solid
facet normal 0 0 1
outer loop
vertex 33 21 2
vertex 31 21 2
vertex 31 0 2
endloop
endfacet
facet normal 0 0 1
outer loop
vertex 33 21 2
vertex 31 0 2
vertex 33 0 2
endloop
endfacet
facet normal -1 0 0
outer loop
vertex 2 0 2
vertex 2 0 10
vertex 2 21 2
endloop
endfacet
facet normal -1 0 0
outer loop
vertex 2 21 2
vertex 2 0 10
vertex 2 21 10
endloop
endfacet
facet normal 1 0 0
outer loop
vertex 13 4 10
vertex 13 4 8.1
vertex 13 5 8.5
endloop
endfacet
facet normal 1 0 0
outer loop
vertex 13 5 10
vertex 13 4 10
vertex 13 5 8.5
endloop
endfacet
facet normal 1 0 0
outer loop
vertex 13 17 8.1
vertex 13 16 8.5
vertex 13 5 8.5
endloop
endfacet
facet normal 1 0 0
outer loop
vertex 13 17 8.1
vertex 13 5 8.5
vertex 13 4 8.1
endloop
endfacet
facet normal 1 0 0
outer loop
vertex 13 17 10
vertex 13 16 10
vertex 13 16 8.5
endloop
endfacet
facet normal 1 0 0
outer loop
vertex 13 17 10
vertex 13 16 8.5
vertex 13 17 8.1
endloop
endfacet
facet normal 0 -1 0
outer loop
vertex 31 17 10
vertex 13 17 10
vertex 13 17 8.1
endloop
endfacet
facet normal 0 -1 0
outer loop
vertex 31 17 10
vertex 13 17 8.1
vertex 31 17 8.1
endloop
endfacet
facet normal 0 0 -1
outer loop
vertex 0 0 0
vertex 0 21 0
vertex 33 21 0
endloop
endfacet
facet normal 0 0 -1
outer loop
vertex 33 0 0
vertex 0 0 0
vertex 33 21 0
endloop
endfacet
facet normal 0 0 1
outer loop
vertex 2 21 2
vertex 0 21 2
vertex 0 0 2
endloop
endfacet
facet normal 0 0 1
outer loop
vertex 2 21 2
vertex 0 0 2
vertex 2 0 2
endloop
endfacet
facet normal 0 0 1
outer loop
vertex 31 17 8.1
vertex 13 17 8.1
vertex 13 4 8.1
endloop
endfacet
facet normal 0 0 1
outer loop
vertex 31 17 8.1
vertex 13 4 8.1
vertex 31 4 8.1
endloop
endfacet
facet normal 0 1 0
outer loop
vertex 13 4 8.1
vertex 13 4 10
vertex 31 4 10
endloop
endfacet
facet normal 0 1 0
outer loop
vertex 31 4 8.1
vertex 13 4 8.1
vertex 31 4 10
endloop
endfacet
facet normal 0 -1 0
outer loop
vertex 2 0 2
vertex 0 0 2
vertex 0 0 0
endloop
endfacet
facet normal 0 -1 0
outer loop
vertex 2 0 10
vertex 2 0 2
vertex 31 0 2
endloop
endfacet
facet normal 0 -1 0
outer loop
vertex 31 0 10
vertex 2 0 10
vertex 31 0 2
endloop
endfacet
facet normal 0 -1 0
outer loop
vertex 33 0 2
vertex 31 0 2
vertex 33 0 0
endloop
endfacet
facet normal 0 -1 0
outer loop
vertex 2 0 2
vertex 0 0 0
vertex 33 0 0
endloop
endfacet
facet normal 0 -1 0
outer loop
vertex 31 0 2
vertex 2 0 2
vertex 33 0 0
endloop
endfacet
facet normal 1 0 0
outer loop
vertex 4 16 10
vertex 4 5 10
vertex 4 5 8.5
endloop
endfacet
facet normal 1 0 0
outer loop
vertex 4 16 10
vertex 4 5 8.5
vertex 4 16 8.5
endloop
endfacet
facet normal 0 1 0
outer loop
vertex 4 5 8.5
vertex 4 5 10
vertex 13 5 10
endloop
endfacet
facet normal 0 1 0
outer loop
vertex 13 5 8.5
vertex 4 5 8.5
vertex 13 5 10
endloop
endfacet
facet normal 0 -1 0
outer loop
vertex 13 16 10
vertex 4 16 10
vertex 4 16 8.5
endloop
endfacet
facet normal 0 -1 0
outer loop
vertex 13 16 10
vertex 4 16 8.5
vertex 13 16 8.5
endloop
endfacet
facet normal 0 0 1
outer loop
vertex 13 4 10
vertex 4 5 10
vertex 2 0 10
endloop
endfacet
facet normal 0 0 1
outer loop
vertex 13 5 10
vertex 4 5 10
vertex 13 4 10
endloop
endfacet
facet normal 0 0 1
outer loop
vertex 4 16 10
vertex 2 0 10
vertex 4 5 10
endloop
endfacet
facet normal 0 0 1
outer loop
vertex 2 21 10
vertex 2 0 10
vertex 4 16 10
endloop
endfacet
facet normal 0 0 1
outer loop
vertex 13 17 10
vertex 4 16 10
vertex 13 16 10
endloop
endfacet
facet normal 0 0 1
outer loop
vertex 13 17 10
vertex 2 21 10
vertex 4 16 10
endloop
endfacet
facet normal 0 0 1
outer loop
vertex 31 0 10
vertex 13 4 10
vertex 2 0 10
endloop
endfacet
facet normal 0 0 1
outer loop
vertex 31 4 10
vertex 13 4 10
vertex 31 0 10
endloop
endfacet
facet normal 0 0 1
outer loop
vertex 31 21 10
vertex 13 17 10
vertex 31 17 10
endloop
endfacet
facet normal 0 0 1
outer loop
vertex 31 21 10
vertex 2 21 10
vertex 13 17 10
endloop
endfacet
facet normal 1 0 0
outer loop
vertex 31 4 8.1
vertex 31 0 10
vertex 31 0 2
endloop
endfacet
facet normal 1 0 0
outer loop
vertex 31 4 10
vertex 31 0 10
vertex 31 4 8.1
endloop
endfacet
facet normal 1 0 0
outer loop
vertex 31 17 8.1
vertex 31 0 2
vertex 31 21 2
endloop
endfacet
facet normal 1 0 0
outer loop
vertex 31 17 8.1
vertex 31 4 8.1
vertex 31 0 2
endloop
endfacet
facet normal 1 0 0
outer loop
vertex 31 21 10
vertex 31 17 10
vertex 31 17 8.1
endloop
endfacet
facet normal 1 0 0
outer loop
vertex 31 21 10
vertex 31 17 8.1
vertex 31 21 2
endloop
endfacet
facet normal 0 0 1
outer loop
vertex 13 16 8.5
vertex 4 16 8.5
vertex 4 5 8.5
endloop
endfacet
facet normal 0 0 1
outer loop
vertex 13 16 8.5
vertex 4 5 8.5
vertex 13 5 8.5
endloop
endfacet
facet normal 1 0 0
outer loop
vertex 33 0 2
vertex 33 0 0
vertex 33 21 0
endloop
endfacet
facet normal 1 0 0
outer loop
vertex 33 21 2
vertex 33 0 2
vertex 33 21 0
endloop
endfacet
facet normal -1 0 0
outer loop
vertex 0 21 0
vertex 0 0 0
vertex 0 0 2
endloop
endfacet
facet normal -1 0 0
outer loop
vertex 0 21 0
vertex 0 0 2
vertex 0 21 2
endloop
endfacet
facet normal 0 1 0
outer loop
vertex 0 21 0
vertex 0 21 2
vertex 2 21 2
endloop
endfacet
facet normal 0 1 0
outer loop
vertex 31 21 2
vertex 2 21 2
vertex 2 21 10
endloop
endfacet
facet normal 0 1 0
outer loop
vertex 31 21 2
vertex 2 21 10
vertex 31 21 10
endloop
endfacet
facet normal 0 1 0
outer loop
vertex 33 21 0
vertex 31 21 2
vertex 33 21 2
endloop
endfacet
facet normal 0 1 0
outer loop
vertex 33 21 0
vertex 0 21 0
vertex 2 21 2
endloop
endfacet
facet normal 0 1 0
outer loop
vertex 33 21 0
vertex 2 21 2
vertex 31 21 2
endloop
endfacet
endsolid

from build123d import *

# Parameters (mm, degrees)
BOX_W           = 33
BOX_H           = 21
BOX_DEPTH       = 10
SKETCH_W        = 2
SKETCH_H        = 21
POCKET_DEPTH    = 8
SKETCH001_W     = 9
SKETCH001_H     = 11
POCKET001_DEPTH = 1.5
SKETCH002_W     = 18
SKETCH002_H     = 13
POCKET002_DEPTH = 1.9


with BuildPart() as part:
    # Box → Box (new body)
    with BuildSketch(Plane.XY):
        with Locations((16.5, 10.5)):
            Rectangle(BOX_W, BOX_H)
    extrude(amount=BOX_DEPTH)

    # Sketch → Pocket (cut)
    with BuildSketch(Plane.XY.offset(10)):
        with Locations((1, 10.5)):
            Rectangle(SKETCH_W, SKETCH_H)
        with Locations((32, 10.5)):
            Rectangle(SKETCH_W, SKETCH_H)
    extrude(amount=-POCKET_DEPTH, mode=Mode.SUBTRACT)

    # Sketch001 → Pocket001 (cut)
    with BuildSketch(Plane.XY.offset(10)):
        with Locations((8.5, 10.5)):
            Rectangle(SKETCH001_W, SKETCH001_H)
    extrude(amount=-POCKET001_DEPTH, mode=Mode.SUBTRACT)

    # Sketch002 → Pocket002 (cut)
    with BuildSketch(Plane.XY.offset(10)):
        with Locations((22, 10.5)):
            Rectangle(SKETCH002_W, SKETCH002_H)
    extrude(amount=-POCKET002_DEPTH, mode=Mode.SUBTRACT)


solid = part.part
